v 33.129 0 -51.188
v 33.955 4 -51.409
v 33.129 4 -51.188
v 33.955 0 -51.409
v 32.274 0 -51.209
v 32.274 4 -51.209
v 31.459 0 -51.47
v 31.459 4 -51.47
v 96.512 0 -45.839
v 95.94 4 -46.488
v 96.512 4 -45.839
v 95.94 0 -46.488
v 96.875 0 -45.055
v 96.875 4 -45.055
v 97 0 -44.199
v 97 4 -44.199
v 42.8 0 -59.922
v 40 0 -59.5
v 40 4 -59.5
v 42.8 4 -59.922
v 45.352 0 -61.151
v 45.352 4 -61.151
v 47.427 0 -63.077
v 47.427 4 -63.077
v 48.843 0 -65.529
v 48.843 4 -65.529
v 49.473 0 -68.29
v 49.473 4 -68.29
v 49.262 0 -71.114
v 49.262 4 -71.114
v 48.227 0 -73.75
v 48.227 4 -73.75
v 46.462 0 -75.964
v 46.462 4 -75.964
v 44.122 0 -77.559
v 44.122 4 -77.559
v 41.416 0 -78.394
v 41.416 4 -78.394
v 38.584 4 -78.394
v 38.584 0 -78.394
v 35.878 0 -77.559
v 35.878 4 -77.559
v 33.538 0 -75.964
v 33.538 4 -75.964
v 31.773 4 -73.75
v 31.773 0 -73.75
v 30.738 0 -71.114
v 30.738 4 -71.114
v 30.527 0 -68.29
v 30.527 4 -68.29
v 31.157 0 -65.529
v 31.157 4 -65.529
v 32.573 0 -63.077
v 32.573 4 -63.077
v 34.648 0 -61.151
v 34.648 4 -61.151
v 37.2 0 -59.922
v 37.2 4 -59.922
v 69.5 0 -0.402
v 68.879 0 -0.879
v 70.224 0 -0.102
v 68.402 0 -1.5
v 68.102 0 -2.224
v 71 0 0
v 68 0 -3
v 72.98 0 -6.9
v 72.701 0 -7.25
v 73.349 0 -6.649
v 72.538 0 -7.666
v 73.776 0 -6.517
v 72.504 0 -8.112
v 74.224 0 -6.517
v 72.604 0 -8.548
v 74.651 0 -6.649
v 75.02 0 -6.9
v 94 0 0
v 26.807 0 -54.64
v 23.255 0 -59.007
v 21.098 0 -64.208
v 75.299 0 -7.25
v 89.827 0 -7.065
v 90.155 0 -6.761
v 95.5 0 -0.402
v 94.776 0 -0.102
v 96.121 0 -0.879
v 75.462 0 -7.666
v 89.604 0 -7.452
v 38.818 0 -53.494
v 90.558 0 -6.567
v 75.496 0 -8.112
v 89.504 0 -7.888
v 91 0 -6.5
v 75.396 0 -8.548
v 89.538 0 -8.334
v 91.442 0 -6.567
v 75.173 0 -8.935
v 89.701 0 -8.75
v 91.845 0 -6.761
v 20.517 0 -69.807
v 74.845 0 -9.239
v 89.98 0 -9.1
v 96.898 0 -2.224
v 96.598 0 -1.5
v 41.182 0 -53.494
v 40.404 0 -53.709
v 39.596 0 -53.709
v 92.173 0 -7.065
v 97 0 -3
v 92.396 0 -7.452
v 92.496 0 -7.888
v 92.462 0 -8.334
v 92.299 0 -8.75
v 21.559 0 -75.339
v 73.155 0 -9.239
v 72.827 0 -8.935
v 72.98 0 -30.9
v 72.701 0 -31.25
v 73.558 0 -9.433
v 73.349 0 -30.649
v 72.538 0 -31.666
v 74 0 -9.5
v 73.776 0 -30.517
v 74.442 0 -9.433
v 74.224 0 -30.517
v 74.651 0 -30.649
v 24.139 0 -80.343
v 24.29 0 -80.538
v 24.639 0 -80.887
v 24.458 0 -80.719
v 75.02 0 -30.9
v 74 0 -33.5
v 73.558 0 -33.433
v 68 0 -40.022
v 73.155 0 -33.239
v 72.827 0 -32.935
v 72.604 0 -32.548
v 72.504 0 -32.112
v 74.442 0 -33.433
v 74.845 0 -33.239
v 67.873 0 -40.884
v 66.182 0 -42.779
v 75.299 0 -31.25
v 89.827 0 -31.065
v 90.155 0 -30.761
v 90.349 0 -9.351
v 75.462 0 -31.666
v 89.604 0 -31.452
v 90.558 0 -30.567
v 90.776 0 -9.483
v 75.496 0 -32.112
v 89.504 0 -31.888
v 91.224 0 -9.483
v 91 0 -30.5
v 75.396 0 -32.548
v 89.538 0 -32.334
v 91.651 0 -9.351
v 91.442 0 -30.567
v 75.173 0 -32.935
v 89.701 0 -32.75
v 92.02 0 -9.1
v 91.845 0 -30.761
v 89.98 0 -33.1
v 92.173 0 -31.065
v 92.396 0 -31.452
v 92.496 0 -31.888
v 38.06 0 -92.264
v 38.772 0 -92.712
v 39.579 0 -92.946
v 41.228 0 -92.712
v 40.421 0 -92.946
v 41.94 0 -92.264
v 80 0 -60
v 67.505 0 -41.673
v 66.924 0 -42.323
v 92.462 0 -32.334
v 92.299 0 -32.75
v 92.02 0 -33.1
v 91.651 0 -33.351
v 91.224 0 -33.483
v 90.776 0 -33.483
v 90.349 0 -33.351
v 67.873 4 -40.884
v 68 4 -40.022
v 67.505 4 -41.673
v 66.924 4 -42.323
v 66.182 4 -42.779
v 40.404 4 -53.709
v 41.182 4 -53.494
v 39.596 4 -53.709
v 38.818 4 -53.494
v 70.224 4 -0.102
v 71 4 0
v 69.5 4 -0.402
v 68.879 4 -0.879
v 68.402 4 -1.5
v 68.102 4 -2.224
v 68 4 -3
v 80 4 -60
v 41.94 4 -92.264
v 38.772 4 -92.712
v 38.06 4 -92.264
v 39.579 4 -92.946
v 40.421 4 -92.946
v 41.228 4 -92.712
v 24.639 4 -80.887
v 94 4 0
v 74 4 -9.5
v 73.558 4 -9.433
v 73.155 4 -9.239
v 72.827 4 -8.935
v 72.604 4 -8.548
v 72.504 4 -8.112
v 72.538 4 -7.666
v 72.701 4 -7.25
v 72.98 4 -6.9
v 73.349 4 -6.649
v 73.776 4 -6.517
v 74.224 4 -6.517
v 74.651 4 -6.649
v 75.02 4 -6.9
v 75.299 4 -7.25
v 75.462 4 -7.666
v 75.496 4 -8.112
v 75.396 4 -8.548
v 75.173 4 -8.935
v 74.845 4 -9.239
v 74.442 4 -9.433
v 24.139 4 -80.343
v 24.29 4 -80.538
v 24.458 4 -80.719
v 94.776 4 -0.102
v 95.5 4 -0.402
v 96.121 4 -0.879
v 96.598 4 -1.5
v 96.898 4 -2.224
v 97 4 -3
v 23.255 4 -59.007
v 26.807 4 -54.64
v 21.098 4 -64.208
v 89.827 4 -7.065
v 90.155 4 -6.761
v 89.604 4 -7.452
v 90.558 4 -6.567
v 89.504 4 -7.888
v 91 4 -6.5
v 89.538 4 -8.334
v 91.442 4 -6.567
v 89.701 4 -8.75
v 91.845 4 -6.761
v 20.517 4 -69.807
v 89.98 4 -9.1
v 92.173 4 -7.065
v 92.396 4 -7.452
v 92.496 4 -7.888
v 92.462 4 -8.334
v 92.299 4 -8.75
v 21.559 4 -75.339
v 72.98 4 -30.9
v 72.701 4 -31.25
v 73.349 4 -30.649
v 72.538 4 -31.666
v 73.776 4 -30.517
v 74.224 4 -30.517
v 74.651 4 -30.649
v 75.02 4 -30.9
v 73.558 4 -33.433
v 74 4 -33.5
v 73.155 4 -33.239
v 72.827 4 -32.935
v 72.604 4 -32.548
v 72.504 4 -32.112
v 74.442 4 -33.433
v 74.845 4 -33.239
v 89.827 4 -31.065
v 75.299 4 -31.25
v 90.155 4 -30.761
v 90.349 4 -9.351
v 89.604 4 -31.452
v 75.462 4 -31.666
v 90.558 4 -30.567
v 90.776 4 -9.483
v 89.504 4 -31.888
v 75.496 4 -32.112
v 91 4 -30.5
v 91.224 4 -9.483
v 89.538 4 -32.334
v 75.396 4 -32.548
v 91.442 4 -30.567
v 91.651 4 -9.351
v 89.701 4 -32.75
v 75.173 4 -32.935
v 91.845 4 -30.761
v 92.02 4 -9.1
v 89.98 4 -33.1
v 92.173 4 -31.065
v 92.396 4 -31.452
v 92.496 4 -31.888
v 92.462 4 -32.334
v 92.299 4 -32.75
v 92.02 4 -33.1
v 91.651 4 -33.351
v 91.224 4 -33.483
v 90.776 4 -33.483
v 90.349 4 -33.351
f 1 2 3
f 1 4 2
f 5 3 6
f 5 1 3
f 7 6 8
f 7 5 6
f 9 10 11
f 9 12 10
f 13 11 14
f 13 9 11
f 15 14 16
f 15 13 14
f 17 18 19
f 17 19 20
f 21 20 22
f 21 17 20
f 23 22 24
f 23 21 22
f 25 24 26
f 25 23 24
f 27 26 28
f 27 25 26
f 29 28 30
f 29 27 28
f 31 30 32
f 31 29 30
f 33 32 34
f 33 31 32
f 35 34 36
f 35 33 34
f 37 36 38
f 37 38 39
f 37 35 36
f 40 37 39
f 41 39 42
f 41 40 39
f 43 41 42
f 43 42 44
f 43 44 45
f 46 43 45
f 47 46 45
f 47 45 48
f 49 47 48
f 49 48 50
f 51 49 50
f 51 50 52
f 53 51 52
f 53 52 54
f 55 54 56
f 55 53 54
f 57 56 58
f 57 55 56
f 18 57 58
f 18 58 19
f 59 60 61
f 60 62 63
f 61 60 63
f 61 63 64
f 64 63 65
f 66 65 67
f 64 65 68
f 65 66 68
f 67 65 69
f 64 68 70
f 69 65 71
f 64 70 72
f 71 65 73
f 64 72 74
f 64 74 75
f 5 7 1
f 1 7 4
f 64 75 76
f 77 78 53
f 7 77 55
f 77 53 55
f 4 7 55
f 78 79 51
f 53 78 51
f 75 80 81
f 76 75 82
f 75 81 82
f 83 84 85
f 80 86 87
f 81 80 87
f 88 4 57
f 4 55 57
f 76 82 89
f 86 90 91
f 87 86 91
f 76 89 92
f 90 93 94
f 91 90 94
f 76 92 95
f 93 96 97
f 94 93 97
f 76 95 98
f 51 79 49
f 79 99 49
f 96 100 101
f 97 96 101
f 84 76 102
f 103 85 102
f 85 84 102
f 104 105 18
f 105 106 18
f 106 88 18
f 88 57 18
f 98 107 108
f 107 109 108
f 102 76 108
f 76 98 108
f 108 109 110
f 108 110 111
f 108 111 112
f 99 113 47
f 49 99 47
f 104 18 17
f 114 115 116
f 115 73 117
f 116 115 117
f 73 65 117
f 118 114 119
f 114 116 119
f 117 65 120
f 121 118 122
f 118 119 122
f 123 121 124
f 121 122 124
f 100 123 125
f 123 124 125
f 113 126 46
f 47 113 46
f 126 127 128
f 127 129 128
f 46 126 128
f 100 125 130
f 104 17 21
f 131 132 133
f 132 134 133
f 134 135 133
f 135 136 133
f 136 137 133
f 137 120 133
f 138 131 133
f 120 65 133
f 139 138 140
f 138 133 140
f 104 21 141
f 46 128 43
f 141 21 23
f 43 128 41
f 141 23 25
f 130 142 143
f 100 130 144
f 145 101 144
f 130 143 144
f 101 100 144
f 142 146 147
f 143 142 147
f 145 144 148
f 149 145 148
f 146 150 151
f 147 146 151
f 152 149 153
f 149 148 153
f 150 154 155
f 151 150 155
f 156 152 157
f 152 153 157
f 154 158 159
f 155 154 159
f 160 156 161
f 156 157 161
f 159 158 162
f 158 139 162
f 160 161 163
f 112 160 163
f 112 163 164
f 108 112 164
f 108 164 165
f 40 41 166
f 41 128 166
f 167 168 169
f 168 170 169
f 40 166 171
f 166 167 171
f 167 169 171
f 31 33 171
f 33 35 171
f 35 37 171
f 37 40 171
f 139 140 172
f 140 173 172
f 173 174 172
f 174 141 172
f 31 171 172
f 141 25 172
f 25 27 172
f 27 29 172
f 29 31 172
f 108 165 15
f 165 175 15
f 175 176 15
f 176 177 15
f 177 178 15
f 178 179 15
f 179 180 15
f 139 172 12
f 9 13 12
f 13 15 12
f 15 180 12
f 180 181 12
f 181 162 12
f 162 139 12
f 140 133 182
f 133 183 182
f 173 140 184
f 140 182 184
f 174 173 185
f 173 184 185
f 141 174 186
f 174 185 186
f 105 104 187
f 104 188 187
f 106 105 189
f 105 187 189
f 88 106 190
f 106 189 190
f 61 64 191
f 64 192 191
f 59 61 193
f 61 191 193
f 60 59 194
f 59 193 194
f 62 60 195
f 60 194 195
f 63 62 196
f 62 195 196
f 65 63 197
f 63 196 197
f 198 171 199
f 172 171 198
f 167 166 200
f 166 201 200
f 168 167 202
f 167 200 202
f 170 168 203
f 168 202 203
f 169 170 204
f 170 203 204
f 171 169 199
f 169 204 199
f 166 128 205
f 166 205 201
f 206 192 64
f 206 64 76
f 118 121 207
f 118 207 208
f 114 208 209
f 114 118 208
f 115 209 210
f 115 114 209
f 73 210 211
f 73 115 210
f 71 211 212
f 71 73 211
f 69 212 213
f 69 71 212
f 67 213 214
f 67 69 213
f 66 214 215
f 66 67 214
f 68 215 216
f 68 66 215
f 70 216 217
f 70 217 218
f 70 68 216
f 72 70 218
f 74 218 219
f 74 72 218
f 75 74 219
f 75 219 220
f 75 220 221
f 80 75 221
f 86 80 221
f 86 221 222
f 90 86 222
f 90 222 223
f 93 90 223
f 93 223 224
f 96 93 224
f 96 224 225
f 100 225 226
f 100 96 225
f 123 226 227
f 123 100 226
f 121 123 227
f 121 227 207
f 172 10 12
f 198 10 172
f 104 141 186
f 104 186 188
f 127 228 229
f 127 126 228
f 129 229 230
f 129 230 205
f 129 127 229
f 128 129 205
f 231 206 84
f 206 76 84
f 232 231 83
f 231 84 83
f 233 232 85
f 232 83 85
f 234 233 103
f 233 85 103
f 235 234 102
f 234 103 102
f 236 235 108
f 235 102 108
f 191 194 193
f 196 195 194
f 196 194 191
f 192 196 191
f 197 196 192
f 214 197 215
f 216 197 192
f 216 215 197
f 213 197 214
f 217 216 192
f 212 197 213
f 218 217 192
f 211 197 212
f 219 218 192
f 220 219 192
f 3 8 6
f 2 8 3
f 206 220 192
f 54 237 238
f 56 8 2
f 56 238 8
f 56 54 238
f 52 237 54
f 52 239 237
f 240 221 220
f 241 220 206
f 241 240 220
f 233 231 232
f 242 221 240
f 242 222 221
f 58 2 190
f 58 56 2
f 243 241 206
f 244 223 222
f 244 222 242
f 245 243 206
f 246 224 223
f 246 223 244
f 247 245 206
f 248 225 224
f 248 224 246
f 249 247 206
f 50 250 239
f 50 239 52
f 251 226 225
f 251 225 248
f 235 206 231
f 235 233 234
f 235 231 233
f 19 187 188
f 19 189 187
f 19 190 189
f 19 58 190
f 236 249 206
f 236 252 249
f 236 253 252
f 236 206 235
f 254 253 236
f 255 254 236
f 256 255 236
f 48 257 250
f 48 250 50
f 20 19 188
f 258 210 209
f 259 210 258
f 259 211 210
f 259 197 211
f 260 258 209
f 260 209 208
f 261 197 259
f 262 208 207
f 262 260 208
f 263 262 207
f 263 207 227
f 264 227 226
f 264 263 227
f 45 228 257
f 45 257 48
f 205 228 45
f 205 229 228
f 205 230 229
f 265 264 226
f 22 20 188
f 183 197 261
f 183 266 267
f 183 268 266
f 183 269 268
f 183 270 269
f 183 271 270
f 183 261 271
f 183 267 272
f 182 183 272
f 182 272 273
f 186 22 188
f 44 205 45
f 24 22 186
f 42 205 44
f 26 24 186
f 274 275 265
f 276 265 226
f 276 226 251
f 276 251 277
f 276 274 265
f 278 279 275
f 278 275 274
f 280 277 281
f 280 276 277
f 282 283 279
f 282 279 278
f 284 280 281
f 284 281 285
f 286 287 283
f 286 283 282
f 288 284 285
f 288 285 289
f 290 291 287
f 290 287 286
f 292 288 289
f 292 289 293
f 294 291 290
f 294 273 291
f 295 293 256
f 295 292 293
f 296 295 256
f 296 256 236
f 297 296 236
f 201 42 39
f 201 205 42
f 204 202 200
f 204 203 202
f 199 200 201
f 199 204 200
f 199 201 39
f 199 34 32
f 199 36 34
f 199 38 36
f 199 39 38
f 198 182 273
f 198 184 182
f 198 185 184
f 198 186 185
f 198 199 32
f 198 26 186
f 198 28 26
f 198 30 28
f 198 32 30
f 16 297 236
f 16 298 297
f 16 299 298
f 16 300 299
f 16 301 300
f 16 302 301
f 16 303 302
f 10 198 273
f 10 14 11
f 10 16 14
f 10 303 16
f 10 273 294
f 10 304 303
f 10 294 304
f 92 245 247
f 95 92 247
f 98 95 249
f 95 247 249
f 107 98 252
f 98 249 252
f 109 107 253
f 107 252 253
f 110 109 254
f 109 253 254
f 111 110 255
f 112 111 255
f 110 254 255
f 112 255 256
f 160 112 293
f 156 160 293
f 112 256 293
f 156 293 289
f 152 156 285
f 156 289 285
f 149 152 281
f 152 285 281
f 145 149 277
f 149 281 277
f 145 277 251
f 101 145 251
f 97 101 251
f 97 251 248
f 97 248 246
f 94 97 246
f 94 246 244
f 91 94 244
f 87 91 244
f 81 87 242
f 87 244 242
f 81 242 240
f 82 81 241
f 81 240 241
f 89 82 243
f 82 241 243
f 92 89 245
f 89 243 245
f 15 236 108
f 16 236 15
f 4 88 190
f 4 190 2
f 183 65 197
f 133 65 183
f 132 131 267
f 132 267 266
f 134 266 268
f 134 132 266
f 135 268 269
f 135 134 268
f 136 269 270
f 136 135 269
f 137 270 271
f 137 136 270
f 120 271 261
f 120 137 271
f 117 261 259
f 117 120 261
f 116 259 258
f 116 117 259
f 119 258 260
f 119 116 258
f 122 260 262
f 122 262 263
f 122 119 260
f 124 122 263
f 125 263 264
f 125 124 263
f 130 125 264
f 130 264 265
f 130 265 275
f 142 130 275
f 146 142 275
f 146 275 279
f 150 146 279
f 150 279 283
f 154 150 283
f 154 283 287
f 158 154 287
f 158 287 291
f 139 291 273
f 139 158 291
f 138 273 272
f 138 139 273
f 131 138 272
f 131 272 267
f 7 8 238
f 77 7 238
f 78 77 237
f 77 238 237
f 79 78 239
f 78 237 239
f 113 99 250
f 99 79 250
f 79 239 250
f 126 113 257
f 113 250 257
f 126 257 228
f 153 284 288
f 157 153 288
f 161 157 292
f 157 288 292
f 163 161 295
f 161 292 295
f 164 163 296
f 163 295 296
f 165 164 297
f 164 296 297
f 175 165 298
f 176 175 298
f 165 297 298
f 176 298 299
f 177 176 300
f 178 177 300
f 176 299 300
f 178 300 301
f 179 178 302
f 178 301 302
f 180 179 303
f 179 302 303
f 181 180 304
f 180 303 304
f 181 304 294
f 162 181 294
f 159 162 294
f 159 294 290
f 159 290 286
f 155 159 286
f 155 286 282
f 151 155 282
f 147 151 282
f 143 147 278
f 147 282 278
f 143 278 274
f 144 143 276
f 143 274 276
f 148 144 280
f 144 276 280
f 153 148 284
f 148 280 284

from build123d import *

# Parameters (mm, degrees)
SKETCH_2_R          = 1.5
SKETCH_2_R_2        = 9.5
EXTRUDE_1_DEPTH     = 4
CUT_EXTRUDE_1_DEPTH = 124.429075185
SKETCH_6_R          = 1.5
EXTRUDE_2_DEPTH     = 4
FILLET_1_R          = 3


with BuildPart() as part:
    # 草图2 → 凸台-拉伸1 (new body)
    with BuildSketch(Plane(origin=(0, 0, 0), x_dir=(1, 0, 0), z_dir=(0, 1, 0))):
        Polygon((0, 0), (0, 60), (40, 93.908128514), (80, 60), (80, 0), (68, 0), (68, 42), (40, 54), (12, 42), (12, 0), align=None)
        with Locations(Location((6, 32, 0), (0, 0, 270))):
            Circle(SKETCH_2_R, mode=Mode.SUBTRACT)
        with Locations(Location((6, 8, 0), (0, 0, 270))):
            Circle(SKETCH_2_R, mode=Mode.SUBTRACT)
        with Locations(Location((40, 69, 0), (0, 0, 270))):
            Circle(SKETCH_2_R_2, mode=Mode.SUBTRACT)
        with Locations(Location((74, 8, 0), (0, 0, 90))):
            Circle(SKETCH_2_R, mode=Mode.SUBTRACT)
        with Locations(Location((74, 32, 0), (0, 0, 90))):
            Circle(SKETCH_2_R, mode=Mode.SUBTRACT)
    extrude(amount=EXTRUDE_1_DEPTH)

    # 草图4 → 切除-拉伸1 (cut, through all)
    with BuildSketch(Plane(origin=(0, 4, 0), x_dir=(1, 0, 0), z_dir=(0, 1, 0))):
        with BuildLine():
            Line((24.36723091, 80.656179931), (0, 60))
            Line((0, 60), (0, 0))
            Line((0, 0), (12, 0))
            Line((12, 0), (12, 42))
            Line((12, 42), (32.756034747, 50.895443463))
            ThreePointArc((32.756034747, 50.895443463), (21.23136653, 63.709593809), (24.36723091, 80.656179931))
        make_face()
    extrude(amount=-CUT_EXTRUDE_1_DEPTH, mode=Mode.SUBTRACT)

    # 草图6 → 凸台-拉伸2 (add)
    with BuildSketch(Plane(origin=(0, 4, 0), x_dir=(1, 0, 0), z_dir=(0, 1, 0))):
        Polygon((97, 45.589045381), (80, 60), (80, 0), (97, 0), align=None)
        with Locations(Location((91, 8, 0), (0, 0, 270))):
            Circle(SKETCH_6_R, mode=Mode.SUBTRACT)
        with Locations(Location((91, 32, 0), (0, 0, 270))):
            Circle(SKETCH_6_R, mode=Mode.SUBTRACT)
    extrude(amount=-EXTRUDE_2_DEPTH)

    # 圆角1
    fillet_1_edges = [part.edges().sort_by_distance(p)[0] for p in [
        (40, 2, -93.908128514),
        (68, 2, 0),
        (68, 2, -42),
        (40, 2, -54),
        (24.36723091, 2, -80.656179931),
        (32.756034747, 2, -50.895443463),
        (97, 2, -45.589045381),
        (97, 2, 0),
    ]]
    fillet(fillet_1_edges, radius=FILLET_1_R)


solid = part.part
